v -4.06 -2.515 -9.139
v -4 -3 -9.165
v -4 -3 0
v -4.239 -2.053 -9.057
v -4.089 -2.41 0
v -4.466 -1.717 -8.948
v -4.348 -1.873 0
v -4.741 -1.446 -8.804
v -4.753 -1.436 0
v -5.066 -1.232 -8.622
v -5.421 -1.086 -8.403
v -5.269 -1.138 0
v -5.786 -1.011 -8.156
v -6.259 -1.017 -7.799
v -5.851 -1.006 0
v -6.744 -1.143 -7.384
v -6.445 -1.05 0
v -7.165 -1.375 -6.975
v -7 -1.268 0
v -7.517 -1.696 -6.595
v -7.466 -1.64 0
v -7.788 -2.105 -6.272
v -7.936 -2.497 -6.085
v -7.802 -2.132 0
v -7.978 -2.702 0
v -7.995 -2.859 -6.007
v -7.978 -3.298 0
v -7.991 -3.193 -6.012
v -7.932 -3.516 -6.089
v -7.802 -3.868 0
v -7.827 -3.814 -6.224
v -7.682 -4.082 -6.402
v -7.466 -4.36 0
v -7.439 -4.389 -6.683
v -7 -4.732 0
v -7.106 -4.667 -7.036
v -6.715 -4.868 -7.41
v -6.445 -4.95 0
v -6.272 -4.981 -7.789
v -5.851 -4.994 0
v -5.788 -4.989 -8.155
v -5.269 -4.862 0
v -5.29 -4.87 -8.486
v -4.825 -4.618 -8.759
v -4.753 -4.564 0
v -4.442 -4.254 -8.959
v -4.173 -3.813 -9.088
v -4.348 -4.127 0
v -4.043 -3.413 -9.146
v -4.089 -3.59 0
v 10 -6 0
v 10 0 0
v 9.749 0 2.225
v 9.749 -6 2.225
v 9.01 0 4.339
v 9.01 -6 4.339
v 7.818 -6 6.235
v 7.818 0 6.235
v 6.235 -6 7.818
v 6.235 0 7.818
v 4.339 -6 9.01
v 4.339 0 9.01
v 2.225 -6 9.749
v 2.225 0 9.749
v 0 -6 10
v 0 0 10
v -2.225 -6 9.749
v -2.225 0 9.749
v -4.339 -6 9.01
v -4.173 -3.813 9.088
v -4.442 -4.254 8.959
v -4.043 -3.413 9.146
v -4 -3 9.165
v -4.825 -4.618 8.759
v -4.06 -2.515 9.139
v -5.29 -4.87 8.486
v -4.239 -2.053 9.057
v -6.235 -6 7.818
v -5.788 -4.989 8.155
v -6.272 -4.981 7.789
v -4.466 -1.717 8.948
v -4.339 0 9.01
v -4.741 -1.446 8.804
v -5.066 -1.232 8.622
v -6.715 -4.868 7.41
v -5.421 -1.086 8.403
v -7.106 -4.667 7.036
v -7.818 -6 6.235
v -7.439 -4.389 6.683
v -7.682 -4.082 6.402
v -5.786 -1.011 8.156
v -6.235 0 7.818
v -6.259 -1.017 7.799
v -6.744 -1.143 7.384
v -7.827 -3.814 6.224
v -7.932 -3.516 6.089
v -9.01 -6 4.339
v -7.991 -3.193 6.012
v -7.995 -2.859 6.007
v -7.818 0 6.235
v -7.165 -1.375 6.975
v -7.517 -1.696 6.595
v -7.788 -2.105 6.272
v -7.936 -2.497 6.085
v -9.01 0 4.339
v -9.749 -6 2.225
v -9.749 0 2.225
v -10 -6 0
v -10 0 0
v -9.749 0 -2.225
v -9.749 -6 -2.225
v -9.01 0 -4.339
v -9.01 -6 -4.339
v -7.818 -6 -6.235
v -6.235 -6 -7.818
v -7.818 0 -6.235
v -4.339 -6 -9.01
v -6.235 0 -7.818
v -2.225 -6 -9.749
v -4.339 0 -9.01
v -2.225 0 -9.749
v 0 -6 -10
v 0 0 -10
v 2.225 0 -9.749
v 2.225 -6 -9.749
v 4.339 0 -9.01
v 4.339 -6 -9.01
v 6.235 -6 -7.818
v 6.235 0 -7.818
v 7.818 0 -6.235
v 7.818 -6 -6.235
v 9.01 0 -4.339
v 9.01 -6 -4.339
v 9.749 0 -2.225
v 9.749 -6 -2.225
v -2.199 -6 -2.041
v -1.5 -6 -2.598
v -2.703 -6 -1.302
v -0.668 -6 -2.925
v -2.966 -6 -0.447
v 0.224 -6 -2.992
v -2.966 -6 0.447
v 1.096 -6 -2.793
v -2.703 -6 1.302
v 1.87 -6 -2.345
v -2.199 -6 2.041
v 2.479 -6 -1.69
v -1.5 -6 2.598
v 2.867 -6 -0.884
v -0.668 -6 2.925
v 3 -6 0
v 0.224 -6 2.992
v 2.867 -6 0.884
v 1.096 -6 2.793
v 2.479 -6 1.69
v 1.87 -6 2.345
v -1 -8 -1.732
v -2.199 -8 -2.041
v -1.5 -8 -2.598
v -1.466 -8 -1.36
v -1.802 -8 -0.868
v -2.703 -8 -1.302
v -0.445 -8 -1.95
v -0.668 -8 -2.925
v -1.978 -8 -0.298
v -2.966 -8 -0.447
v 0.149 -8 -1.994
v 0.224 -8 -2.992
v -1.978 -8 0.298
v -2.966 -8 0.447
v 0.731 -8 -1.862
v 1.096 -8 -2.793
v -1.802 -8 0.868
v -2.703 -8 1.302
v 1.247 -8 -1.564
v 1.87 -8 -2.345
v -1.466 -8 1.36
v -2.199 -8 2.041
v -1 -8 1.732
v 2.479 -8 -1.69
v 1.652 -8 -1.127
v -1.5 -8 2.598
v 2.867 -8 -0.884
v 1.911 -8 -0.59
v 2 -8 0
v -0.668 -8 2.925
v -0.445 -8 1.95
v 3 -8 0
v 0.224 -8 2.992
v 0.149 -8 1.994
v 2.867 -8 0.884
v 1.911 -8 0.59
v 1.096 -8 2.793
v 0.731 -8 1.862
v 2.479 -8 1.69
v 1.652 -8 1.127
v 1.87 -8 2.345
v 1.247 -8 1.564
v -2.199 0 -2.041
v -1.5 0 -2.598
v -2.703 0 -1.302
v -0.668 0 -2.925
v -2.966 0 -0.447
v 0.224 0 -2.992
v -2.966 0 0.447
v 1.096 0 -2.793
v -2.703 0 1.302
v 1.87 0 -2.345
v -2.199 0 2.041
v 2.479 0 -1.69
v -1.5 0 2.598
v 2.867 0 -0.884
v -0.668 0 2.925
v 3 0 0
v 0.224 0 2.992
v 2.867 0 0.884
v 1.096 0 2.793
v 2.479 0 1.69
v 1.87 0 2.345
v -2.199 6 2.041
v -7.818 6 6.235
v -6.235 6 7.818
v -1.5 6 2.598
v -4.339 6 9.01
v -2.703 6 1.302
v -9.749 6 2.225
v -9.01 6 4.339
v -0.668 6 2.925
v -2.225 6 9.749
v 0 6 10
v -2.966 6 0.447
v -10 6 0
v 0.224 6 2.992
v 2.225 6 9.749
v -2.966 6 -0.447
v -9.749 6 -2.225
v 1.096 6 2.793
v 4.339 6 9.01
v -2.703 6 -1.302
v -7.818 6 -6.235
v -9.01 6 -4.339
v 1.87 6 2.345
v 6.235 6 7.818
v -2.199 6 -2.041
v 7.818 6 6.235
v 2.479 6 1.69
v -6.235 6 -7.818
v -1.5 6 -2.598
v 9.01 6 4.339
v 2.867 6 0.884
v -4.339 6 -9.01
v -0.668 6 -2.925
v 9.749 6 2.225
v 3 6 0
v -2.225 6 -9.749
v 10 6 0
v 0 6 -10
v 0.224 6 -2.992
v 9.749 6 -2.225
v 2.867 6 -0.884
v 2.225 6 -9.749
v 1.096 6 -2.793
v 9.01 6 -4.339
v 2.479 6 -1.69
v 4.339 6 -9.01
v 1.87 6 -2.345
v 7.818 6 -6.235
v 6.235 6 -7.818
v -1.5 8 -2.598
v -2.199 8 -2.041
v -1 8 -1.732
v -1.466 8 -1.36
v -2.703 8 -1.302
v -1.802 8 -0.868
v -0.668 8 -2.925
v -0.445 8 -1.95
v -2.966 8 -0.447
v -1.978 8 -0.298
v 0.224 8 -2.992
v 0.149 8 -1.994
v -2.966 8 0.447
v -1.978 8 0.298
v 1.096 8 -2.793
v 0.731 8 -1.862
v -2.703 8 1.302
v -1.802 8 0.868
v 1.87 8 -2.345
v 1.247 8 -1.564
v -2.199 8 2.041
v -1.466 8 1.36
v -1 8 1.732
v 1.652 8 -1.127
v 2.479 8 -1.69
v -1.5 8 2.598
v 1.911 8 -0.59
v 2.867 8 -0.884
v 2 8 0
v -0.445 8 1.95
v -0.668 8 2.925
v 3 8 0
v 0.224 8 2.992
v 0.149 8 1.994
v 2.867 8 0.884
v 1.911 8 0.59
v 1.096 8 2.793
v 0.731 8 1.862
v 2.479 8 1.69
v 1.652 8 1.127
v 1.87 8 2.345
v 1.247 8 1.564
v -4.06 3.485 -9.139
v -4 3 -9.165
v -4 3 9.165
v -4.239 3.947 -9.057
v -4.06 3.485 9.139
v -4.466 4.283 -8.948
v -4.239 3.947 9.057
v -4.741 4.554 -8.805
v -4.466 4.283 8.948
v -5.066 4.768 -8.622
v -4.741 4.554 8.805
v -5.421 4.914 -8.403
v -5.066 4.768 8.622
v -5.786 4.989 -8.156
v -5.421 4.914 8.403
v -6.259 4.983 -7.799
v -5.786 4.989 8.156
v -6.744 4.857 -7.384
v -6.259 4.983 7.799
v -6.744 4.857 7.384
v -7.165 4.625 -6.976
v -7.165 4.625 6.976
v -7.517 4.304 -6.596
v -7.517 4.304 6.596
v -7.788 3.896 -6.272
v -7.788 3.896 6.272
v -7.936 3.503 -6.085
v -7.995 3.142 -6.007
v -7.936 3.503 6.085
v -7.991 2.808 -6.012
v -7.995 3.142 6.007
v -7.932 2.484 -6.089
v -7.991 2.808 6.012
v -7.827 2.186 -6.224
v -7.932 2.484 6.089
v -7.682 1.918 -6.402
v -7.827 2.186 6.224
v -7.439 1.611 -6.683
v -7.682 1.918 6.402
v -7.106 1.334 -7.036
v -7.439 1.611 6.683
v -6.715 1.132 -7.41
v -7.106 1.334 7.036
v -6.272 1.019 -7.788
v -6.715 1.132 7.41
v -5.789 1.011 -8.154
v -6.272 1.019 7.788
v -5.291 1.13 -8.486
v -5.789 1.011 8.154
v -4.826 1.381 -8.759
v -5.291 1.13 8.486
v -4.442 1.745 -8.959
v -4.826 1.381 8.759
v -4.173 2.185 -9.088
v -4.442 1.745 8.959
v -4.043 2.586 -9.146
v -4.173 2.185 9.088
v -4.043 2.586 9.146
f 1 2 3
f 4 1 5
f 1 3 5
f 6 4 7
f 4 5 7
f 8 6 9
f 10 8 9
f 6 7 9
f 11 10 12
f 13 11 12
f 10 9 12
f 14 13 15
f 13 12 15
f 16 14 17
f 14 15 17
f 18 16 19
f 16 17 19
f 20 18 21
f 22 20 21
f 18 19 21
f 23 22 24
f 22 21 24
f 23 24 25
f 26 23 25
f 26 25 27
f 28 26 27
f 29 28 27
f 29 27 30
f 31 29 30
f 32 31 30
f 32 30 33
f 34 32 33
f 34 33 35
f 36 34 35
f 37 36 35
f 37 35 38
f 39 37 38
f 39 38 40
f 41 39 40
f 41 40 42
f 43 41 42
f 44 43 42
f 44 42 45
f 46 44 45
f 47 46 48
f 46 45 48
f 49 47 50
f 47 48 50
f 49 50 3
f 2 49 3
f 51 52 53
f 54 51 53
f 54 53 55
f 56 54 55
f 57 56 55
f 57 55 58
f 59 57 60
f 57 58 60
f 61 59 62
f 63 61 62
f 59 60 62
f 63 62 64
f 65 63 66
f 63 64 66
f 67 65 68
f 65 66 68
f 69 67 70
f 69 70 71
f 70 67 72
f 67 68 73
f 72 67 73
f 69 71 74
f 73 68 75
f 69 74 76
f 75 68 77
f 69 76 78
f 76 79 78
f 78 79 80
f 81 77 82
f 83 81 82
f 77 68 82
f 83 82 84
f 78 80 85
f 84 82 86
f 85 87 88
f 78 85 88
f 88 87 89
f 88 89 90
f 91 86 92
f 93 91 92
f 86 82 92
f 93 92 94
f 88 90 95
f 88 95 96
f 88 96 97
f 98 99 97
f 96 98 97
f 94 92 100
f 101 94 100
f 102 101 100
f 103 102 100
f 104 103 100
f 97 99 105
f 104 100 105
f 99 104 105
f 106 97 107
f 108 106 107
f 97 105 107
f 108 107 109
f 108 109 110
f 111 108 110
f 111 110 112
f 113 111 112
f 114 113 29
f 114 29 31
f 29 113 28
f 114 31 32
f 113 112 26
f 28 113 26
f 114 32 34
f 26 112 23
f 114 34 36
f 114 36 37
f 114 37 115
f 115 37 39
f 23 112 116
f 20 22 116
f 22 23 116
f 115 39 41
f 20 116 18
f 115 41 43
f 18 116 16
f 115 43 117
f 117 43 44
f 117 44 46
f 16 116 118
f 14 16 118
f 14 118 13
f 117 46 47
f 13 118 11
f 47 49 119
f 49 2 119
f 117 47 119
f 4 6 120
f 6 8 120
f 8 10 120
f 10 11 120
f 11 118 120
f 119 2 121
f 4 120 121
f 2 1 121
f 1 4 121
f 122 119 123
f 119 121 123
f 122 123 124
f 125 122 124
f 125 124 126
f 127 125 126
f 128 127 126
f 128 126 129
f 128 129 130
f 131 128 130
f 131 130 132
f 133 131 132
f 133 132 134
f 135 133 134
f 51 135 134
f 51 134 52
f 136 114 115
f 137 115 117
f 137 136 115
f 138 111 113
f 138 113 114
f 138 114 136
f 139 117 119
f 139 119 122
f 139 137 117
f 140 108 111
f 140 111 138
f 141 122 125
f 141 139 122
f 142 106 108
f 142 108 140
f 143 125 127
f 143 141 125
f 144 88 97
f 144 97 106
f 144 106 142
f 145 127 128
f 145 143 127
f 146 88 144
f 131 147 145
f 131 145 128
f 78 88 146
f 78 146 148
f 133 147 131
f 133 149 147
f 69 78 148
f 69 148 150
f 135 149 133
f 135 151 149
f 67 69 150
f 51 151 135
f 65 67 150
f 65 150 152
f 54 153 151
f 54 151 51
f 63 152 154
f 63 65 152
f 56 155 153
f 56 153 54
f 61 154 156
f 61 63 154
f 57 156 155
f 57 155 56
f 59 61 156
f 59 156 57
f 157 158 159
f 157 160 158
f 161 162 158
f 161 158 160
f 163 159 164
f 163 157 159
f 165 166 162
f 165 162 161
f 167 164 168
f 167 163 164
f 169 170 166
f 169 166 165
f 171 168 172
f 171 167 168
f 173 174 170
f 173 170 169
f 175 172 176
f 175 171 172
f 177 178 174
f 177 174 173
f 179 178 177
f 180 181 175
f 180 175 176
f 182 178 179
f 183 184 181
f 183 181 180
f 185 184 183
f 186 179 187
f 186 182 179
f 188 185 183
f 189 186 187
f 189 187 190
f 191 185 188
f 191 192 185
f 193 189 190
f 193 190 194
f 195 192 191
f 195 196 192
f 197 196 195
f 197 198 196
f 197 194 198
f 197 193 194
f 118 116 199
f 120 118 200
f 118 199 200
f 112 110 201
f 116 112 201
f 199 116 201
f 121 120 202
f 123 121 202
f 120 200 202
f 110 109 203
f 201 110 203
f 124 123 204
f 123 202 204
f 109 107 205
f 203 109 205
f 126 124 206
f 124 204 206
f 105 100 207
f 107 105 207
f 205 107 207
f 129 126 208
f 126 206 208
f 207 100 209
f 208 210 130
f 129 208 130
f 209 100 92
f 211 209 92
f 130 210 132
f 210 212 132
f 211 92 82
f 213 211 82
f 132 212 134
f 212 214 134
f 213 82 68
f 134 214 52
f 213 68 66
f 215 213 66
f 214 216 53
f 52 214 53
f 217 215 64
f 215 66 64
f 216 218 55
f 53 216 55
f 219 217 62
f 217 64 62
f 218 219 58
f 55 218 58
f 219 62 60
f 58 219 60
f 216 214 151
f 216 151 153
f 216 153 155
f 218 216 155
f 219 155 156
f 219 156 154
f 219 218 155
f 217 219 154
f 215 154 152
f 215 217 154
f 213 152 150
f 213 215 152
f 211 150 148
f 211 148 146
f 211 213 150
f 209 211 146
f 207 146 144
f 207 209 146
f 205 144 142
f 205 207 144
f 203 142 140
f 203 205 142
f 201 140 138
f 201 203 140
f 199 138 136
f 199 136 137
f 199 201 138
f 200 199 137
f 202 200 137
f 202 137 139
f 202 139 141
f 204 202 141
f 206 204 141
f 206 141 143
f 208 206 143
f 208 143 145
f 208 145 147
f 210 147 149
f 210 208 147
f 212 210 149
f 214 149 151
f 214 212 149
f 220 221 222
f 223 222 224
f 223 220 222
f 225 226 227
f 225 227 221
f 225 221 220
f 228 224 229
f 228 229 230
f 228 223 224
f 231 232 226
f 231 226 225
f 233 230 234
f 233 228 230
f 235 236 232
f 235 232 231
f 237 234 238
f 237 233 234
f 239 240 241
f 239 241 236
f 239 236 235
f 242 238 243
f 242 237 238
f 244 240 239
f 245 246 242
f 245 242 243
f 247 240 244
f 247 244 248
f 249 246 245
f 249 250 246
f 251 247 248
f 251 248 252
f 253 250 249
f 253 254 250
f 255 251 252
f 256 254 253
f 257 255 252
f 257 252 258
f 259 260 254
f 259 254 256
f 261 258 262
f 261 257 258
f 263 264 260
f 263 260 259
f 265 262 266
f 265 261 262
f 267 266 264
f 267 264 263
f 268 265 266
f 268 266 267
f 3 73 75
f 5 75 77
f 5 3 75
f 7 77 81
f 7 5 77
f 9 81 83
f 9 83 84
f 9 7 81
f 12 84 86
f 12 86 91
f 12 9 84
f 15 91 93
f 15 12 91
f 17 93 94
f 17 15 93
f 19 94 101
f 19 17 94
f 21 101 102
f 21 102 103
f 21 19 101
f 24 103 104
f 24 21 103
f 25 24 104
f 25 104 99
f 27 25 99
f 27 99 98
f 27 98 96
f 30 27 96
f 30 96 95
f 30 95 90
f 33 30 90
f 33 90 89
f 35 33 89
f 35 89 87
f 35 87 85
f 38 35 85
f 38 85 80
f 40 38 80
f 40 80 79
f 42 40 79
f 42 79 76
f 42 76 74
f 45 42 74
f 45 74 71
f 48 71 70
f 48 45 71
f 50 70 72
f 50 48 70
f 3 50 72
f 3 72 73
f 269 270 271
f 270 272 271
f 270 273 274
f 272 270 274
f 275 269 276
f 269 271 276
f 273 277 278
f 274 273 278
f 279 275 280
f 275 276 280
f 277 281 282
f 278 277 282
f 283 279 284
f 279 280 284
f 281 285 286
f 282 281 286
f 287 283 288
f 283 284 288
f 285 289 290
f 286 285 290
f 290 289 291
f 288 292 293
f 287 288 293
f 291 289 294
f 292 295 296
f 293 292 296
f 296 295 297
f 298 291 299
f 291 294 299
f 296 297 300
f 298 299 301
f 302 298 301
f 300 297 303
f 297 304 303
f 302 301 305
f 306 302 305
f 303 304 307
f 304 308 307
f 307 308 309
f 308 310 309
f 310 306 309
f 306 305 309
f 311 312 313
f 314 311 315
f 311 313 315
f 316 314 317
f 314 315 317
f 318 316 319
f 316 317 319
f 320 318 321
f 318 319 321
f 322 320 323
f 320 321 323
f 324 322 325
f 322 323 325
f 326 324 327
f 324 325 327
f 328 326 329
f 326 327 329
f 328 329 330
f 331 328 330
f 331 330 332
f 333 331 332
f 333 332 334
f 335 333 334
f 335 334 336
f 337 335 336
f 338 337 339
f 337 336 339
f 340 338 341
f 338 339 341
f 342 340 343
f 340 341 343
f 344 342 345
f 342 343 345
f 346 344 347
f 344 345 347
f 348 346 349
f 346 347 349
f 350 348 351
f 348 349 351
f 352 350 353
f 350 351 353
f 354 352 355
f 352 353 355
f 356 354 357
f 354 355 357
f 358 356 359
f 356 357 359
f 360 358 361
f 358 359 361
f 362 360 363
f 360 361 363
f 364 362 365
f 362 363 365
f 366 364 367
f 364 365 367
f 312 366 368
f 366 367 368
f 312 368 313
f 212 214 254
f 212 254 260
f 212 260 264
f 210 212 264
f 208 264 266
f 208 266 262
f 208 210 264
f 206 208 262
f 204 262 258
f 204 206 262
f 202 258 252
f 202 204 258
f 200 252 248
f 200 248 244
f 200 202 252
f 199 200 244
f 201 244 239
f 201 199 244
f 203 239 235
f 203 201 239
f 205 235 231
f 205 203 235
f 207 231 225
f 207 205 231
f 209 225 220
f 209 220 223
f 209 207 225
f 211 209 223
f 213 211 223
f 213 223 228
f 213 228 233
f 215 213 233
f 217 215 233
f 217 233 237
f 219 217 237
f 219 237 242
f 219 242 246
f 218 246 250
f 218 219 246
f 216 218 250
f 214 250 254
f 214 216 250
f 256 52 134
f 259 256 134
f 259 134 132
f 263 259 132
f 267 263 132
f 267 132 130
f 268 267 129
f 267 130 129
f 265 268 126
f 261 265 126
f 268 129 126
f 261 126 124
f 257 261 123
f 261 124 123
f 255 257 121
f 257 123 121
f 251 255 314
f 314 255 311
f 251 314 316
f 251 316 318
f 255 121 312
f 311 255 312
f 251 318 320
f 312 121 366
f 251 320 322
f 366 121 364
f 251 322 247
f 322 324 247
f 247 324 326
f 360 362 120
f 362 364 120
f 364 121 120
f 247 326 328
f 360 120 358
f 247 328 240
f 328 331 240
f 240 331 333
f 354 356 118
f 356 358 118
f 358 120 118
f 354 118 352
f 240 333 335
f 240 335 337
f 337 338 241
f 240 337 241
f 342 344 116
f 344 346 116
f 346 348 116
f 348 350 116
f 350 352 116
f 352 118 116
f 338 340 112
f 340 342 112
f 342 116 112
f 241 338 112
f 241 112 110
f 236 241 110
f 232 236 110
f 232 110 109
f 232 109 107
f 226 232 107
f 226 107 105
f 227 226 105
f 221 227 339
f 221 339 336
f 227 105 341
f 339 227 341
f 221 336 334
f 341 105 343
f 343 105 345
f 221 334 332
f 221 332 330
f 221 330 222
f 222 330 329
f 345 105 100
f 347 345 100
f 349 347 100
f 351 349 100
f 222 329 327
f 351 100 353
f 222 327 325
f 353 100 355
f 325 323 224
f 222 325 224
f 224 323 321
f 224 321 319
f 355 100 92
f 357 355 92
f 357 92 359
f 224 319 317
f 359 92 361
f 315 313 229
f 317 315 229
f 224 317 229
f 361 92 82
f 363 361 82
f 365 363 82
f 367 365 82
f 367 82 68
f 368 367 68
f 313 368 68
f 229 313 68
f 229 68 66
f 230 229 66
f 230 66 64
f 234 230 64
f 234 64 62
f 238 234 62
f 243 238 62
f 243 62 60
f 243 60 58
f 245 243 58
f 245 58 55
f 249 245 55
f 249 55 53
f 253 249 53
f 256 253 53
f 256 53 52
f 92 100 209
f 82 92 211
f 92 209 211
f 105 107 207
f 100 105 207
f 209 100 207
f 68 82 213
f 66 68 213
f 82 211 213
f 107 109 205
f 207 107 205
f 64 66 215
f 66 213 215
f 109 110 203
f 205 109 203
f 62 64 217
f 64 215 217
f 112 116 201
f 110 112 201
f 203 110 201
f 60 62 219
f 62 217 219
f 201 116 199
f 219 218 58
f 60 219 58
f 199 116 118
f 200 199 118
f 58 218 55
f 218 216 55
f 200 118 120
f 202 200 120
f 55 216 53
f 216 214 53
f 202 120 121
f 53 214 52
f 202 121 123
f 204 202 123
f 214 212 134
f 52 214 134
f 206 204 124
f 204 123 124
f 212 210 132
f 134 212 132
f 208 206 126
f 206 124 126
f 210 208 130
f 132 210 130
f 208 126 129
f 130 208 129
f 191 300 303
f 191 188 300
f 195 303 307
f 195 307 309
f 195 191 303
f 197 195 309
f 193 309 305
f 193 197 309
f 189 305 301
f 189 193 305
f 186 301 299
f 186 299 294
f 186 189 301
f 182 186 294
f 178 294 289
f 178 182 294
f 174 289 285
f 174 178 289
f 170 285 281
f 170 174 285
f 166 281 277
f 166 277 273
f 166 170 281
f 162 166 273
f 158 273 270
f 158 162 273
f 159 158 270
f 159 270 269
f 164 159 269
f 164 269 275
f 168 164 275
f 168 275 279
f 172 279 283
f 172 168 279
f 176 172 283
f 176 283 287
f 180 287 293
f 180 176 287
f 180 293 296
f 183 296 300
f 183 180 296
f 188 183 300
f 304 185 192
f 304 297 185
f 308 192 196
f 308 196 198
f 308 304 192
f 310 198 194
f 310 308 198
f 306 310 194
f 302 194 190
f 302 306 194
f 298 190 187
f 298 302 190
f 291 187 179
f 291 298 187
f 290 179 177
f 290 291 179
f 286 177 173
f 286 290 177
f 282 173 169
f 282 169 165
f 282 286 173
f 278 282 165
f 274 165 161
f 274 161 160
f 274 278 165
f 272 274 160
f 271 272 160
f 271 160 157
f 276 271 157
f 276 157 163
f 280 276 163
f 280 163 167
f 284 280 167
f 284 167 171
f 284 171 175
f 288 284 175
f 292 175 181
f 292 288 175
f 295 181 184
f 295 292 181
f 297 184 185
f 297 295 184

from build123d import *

# Parameters (mm, degrees)
F0_R        = 3
F0_R_2      = 2
F1_DEPTH    = 8
F2_R        = 10
F2_R_2      = 3
F3_DEPTH    = 6
F3_FACE_R   = 10
F3_FACE_R_2 = 3
F4_DEPTH    = 6
F5_R        = 2
F6_DEPTH    = 12.5


with BuildPart() as f1:
    # F0 (on Front) → F1 (new body, symmetric)
    with BuildSketch(Plane.XZ):
        Circle(F0_R)
        Circle(F0_R_2, mode=Mode.SUBTRACT)
    extrude(amount=F1_DEPTH, both=True)


with BuildPart() as f3:
    # F2 (on Front) → F3 (new body)
    with BuildSketch(Plane.XZ):
        Circle(F2_R)
        Circle(F2_R_2, mode=Mode.SUBTRACT)
    extrude(amount=F3_DEPTH)


with BuildPart() as f4:
    # F3_face (on face) → F4 (new body)
    with BuildSketch(Plane(origin=(0, 0, 0), x_dir=(1, 0, 0), z_dir=(0, 1, 0))):
        Circle(F3_FACE_R)
        Circle(F3_FACE_R_2, mode=Mode.SUBTRACT)
    extrude(amount=F4_DEPTH)


with BuildPart() as f6_tool:
    # F5 (on Top) → F6 (new body, symmetric)
    with BuildSketch(Plane.XY):
        with Locations((-6, -3)):
            Circle(F5_R)
        with Locations((-6, 3)):
            Circle(F5_R)
    extrude(amount=F6_DEPTH, both=True)


with BuildPart() as f3_1:
    add(f3.part)

    # F6: cut by f6_tool
    add(f6_tool.part, mode=Mode.SUBTRACT)


with BuildPart() as f4_1:
    add(f4.part)

    # F6: cut by f6_tool
    add(f6_tool.part, mode=Mode.SUBTRACT)


solid = Compound([f1.part, f3_1.part, f4_1.part])
